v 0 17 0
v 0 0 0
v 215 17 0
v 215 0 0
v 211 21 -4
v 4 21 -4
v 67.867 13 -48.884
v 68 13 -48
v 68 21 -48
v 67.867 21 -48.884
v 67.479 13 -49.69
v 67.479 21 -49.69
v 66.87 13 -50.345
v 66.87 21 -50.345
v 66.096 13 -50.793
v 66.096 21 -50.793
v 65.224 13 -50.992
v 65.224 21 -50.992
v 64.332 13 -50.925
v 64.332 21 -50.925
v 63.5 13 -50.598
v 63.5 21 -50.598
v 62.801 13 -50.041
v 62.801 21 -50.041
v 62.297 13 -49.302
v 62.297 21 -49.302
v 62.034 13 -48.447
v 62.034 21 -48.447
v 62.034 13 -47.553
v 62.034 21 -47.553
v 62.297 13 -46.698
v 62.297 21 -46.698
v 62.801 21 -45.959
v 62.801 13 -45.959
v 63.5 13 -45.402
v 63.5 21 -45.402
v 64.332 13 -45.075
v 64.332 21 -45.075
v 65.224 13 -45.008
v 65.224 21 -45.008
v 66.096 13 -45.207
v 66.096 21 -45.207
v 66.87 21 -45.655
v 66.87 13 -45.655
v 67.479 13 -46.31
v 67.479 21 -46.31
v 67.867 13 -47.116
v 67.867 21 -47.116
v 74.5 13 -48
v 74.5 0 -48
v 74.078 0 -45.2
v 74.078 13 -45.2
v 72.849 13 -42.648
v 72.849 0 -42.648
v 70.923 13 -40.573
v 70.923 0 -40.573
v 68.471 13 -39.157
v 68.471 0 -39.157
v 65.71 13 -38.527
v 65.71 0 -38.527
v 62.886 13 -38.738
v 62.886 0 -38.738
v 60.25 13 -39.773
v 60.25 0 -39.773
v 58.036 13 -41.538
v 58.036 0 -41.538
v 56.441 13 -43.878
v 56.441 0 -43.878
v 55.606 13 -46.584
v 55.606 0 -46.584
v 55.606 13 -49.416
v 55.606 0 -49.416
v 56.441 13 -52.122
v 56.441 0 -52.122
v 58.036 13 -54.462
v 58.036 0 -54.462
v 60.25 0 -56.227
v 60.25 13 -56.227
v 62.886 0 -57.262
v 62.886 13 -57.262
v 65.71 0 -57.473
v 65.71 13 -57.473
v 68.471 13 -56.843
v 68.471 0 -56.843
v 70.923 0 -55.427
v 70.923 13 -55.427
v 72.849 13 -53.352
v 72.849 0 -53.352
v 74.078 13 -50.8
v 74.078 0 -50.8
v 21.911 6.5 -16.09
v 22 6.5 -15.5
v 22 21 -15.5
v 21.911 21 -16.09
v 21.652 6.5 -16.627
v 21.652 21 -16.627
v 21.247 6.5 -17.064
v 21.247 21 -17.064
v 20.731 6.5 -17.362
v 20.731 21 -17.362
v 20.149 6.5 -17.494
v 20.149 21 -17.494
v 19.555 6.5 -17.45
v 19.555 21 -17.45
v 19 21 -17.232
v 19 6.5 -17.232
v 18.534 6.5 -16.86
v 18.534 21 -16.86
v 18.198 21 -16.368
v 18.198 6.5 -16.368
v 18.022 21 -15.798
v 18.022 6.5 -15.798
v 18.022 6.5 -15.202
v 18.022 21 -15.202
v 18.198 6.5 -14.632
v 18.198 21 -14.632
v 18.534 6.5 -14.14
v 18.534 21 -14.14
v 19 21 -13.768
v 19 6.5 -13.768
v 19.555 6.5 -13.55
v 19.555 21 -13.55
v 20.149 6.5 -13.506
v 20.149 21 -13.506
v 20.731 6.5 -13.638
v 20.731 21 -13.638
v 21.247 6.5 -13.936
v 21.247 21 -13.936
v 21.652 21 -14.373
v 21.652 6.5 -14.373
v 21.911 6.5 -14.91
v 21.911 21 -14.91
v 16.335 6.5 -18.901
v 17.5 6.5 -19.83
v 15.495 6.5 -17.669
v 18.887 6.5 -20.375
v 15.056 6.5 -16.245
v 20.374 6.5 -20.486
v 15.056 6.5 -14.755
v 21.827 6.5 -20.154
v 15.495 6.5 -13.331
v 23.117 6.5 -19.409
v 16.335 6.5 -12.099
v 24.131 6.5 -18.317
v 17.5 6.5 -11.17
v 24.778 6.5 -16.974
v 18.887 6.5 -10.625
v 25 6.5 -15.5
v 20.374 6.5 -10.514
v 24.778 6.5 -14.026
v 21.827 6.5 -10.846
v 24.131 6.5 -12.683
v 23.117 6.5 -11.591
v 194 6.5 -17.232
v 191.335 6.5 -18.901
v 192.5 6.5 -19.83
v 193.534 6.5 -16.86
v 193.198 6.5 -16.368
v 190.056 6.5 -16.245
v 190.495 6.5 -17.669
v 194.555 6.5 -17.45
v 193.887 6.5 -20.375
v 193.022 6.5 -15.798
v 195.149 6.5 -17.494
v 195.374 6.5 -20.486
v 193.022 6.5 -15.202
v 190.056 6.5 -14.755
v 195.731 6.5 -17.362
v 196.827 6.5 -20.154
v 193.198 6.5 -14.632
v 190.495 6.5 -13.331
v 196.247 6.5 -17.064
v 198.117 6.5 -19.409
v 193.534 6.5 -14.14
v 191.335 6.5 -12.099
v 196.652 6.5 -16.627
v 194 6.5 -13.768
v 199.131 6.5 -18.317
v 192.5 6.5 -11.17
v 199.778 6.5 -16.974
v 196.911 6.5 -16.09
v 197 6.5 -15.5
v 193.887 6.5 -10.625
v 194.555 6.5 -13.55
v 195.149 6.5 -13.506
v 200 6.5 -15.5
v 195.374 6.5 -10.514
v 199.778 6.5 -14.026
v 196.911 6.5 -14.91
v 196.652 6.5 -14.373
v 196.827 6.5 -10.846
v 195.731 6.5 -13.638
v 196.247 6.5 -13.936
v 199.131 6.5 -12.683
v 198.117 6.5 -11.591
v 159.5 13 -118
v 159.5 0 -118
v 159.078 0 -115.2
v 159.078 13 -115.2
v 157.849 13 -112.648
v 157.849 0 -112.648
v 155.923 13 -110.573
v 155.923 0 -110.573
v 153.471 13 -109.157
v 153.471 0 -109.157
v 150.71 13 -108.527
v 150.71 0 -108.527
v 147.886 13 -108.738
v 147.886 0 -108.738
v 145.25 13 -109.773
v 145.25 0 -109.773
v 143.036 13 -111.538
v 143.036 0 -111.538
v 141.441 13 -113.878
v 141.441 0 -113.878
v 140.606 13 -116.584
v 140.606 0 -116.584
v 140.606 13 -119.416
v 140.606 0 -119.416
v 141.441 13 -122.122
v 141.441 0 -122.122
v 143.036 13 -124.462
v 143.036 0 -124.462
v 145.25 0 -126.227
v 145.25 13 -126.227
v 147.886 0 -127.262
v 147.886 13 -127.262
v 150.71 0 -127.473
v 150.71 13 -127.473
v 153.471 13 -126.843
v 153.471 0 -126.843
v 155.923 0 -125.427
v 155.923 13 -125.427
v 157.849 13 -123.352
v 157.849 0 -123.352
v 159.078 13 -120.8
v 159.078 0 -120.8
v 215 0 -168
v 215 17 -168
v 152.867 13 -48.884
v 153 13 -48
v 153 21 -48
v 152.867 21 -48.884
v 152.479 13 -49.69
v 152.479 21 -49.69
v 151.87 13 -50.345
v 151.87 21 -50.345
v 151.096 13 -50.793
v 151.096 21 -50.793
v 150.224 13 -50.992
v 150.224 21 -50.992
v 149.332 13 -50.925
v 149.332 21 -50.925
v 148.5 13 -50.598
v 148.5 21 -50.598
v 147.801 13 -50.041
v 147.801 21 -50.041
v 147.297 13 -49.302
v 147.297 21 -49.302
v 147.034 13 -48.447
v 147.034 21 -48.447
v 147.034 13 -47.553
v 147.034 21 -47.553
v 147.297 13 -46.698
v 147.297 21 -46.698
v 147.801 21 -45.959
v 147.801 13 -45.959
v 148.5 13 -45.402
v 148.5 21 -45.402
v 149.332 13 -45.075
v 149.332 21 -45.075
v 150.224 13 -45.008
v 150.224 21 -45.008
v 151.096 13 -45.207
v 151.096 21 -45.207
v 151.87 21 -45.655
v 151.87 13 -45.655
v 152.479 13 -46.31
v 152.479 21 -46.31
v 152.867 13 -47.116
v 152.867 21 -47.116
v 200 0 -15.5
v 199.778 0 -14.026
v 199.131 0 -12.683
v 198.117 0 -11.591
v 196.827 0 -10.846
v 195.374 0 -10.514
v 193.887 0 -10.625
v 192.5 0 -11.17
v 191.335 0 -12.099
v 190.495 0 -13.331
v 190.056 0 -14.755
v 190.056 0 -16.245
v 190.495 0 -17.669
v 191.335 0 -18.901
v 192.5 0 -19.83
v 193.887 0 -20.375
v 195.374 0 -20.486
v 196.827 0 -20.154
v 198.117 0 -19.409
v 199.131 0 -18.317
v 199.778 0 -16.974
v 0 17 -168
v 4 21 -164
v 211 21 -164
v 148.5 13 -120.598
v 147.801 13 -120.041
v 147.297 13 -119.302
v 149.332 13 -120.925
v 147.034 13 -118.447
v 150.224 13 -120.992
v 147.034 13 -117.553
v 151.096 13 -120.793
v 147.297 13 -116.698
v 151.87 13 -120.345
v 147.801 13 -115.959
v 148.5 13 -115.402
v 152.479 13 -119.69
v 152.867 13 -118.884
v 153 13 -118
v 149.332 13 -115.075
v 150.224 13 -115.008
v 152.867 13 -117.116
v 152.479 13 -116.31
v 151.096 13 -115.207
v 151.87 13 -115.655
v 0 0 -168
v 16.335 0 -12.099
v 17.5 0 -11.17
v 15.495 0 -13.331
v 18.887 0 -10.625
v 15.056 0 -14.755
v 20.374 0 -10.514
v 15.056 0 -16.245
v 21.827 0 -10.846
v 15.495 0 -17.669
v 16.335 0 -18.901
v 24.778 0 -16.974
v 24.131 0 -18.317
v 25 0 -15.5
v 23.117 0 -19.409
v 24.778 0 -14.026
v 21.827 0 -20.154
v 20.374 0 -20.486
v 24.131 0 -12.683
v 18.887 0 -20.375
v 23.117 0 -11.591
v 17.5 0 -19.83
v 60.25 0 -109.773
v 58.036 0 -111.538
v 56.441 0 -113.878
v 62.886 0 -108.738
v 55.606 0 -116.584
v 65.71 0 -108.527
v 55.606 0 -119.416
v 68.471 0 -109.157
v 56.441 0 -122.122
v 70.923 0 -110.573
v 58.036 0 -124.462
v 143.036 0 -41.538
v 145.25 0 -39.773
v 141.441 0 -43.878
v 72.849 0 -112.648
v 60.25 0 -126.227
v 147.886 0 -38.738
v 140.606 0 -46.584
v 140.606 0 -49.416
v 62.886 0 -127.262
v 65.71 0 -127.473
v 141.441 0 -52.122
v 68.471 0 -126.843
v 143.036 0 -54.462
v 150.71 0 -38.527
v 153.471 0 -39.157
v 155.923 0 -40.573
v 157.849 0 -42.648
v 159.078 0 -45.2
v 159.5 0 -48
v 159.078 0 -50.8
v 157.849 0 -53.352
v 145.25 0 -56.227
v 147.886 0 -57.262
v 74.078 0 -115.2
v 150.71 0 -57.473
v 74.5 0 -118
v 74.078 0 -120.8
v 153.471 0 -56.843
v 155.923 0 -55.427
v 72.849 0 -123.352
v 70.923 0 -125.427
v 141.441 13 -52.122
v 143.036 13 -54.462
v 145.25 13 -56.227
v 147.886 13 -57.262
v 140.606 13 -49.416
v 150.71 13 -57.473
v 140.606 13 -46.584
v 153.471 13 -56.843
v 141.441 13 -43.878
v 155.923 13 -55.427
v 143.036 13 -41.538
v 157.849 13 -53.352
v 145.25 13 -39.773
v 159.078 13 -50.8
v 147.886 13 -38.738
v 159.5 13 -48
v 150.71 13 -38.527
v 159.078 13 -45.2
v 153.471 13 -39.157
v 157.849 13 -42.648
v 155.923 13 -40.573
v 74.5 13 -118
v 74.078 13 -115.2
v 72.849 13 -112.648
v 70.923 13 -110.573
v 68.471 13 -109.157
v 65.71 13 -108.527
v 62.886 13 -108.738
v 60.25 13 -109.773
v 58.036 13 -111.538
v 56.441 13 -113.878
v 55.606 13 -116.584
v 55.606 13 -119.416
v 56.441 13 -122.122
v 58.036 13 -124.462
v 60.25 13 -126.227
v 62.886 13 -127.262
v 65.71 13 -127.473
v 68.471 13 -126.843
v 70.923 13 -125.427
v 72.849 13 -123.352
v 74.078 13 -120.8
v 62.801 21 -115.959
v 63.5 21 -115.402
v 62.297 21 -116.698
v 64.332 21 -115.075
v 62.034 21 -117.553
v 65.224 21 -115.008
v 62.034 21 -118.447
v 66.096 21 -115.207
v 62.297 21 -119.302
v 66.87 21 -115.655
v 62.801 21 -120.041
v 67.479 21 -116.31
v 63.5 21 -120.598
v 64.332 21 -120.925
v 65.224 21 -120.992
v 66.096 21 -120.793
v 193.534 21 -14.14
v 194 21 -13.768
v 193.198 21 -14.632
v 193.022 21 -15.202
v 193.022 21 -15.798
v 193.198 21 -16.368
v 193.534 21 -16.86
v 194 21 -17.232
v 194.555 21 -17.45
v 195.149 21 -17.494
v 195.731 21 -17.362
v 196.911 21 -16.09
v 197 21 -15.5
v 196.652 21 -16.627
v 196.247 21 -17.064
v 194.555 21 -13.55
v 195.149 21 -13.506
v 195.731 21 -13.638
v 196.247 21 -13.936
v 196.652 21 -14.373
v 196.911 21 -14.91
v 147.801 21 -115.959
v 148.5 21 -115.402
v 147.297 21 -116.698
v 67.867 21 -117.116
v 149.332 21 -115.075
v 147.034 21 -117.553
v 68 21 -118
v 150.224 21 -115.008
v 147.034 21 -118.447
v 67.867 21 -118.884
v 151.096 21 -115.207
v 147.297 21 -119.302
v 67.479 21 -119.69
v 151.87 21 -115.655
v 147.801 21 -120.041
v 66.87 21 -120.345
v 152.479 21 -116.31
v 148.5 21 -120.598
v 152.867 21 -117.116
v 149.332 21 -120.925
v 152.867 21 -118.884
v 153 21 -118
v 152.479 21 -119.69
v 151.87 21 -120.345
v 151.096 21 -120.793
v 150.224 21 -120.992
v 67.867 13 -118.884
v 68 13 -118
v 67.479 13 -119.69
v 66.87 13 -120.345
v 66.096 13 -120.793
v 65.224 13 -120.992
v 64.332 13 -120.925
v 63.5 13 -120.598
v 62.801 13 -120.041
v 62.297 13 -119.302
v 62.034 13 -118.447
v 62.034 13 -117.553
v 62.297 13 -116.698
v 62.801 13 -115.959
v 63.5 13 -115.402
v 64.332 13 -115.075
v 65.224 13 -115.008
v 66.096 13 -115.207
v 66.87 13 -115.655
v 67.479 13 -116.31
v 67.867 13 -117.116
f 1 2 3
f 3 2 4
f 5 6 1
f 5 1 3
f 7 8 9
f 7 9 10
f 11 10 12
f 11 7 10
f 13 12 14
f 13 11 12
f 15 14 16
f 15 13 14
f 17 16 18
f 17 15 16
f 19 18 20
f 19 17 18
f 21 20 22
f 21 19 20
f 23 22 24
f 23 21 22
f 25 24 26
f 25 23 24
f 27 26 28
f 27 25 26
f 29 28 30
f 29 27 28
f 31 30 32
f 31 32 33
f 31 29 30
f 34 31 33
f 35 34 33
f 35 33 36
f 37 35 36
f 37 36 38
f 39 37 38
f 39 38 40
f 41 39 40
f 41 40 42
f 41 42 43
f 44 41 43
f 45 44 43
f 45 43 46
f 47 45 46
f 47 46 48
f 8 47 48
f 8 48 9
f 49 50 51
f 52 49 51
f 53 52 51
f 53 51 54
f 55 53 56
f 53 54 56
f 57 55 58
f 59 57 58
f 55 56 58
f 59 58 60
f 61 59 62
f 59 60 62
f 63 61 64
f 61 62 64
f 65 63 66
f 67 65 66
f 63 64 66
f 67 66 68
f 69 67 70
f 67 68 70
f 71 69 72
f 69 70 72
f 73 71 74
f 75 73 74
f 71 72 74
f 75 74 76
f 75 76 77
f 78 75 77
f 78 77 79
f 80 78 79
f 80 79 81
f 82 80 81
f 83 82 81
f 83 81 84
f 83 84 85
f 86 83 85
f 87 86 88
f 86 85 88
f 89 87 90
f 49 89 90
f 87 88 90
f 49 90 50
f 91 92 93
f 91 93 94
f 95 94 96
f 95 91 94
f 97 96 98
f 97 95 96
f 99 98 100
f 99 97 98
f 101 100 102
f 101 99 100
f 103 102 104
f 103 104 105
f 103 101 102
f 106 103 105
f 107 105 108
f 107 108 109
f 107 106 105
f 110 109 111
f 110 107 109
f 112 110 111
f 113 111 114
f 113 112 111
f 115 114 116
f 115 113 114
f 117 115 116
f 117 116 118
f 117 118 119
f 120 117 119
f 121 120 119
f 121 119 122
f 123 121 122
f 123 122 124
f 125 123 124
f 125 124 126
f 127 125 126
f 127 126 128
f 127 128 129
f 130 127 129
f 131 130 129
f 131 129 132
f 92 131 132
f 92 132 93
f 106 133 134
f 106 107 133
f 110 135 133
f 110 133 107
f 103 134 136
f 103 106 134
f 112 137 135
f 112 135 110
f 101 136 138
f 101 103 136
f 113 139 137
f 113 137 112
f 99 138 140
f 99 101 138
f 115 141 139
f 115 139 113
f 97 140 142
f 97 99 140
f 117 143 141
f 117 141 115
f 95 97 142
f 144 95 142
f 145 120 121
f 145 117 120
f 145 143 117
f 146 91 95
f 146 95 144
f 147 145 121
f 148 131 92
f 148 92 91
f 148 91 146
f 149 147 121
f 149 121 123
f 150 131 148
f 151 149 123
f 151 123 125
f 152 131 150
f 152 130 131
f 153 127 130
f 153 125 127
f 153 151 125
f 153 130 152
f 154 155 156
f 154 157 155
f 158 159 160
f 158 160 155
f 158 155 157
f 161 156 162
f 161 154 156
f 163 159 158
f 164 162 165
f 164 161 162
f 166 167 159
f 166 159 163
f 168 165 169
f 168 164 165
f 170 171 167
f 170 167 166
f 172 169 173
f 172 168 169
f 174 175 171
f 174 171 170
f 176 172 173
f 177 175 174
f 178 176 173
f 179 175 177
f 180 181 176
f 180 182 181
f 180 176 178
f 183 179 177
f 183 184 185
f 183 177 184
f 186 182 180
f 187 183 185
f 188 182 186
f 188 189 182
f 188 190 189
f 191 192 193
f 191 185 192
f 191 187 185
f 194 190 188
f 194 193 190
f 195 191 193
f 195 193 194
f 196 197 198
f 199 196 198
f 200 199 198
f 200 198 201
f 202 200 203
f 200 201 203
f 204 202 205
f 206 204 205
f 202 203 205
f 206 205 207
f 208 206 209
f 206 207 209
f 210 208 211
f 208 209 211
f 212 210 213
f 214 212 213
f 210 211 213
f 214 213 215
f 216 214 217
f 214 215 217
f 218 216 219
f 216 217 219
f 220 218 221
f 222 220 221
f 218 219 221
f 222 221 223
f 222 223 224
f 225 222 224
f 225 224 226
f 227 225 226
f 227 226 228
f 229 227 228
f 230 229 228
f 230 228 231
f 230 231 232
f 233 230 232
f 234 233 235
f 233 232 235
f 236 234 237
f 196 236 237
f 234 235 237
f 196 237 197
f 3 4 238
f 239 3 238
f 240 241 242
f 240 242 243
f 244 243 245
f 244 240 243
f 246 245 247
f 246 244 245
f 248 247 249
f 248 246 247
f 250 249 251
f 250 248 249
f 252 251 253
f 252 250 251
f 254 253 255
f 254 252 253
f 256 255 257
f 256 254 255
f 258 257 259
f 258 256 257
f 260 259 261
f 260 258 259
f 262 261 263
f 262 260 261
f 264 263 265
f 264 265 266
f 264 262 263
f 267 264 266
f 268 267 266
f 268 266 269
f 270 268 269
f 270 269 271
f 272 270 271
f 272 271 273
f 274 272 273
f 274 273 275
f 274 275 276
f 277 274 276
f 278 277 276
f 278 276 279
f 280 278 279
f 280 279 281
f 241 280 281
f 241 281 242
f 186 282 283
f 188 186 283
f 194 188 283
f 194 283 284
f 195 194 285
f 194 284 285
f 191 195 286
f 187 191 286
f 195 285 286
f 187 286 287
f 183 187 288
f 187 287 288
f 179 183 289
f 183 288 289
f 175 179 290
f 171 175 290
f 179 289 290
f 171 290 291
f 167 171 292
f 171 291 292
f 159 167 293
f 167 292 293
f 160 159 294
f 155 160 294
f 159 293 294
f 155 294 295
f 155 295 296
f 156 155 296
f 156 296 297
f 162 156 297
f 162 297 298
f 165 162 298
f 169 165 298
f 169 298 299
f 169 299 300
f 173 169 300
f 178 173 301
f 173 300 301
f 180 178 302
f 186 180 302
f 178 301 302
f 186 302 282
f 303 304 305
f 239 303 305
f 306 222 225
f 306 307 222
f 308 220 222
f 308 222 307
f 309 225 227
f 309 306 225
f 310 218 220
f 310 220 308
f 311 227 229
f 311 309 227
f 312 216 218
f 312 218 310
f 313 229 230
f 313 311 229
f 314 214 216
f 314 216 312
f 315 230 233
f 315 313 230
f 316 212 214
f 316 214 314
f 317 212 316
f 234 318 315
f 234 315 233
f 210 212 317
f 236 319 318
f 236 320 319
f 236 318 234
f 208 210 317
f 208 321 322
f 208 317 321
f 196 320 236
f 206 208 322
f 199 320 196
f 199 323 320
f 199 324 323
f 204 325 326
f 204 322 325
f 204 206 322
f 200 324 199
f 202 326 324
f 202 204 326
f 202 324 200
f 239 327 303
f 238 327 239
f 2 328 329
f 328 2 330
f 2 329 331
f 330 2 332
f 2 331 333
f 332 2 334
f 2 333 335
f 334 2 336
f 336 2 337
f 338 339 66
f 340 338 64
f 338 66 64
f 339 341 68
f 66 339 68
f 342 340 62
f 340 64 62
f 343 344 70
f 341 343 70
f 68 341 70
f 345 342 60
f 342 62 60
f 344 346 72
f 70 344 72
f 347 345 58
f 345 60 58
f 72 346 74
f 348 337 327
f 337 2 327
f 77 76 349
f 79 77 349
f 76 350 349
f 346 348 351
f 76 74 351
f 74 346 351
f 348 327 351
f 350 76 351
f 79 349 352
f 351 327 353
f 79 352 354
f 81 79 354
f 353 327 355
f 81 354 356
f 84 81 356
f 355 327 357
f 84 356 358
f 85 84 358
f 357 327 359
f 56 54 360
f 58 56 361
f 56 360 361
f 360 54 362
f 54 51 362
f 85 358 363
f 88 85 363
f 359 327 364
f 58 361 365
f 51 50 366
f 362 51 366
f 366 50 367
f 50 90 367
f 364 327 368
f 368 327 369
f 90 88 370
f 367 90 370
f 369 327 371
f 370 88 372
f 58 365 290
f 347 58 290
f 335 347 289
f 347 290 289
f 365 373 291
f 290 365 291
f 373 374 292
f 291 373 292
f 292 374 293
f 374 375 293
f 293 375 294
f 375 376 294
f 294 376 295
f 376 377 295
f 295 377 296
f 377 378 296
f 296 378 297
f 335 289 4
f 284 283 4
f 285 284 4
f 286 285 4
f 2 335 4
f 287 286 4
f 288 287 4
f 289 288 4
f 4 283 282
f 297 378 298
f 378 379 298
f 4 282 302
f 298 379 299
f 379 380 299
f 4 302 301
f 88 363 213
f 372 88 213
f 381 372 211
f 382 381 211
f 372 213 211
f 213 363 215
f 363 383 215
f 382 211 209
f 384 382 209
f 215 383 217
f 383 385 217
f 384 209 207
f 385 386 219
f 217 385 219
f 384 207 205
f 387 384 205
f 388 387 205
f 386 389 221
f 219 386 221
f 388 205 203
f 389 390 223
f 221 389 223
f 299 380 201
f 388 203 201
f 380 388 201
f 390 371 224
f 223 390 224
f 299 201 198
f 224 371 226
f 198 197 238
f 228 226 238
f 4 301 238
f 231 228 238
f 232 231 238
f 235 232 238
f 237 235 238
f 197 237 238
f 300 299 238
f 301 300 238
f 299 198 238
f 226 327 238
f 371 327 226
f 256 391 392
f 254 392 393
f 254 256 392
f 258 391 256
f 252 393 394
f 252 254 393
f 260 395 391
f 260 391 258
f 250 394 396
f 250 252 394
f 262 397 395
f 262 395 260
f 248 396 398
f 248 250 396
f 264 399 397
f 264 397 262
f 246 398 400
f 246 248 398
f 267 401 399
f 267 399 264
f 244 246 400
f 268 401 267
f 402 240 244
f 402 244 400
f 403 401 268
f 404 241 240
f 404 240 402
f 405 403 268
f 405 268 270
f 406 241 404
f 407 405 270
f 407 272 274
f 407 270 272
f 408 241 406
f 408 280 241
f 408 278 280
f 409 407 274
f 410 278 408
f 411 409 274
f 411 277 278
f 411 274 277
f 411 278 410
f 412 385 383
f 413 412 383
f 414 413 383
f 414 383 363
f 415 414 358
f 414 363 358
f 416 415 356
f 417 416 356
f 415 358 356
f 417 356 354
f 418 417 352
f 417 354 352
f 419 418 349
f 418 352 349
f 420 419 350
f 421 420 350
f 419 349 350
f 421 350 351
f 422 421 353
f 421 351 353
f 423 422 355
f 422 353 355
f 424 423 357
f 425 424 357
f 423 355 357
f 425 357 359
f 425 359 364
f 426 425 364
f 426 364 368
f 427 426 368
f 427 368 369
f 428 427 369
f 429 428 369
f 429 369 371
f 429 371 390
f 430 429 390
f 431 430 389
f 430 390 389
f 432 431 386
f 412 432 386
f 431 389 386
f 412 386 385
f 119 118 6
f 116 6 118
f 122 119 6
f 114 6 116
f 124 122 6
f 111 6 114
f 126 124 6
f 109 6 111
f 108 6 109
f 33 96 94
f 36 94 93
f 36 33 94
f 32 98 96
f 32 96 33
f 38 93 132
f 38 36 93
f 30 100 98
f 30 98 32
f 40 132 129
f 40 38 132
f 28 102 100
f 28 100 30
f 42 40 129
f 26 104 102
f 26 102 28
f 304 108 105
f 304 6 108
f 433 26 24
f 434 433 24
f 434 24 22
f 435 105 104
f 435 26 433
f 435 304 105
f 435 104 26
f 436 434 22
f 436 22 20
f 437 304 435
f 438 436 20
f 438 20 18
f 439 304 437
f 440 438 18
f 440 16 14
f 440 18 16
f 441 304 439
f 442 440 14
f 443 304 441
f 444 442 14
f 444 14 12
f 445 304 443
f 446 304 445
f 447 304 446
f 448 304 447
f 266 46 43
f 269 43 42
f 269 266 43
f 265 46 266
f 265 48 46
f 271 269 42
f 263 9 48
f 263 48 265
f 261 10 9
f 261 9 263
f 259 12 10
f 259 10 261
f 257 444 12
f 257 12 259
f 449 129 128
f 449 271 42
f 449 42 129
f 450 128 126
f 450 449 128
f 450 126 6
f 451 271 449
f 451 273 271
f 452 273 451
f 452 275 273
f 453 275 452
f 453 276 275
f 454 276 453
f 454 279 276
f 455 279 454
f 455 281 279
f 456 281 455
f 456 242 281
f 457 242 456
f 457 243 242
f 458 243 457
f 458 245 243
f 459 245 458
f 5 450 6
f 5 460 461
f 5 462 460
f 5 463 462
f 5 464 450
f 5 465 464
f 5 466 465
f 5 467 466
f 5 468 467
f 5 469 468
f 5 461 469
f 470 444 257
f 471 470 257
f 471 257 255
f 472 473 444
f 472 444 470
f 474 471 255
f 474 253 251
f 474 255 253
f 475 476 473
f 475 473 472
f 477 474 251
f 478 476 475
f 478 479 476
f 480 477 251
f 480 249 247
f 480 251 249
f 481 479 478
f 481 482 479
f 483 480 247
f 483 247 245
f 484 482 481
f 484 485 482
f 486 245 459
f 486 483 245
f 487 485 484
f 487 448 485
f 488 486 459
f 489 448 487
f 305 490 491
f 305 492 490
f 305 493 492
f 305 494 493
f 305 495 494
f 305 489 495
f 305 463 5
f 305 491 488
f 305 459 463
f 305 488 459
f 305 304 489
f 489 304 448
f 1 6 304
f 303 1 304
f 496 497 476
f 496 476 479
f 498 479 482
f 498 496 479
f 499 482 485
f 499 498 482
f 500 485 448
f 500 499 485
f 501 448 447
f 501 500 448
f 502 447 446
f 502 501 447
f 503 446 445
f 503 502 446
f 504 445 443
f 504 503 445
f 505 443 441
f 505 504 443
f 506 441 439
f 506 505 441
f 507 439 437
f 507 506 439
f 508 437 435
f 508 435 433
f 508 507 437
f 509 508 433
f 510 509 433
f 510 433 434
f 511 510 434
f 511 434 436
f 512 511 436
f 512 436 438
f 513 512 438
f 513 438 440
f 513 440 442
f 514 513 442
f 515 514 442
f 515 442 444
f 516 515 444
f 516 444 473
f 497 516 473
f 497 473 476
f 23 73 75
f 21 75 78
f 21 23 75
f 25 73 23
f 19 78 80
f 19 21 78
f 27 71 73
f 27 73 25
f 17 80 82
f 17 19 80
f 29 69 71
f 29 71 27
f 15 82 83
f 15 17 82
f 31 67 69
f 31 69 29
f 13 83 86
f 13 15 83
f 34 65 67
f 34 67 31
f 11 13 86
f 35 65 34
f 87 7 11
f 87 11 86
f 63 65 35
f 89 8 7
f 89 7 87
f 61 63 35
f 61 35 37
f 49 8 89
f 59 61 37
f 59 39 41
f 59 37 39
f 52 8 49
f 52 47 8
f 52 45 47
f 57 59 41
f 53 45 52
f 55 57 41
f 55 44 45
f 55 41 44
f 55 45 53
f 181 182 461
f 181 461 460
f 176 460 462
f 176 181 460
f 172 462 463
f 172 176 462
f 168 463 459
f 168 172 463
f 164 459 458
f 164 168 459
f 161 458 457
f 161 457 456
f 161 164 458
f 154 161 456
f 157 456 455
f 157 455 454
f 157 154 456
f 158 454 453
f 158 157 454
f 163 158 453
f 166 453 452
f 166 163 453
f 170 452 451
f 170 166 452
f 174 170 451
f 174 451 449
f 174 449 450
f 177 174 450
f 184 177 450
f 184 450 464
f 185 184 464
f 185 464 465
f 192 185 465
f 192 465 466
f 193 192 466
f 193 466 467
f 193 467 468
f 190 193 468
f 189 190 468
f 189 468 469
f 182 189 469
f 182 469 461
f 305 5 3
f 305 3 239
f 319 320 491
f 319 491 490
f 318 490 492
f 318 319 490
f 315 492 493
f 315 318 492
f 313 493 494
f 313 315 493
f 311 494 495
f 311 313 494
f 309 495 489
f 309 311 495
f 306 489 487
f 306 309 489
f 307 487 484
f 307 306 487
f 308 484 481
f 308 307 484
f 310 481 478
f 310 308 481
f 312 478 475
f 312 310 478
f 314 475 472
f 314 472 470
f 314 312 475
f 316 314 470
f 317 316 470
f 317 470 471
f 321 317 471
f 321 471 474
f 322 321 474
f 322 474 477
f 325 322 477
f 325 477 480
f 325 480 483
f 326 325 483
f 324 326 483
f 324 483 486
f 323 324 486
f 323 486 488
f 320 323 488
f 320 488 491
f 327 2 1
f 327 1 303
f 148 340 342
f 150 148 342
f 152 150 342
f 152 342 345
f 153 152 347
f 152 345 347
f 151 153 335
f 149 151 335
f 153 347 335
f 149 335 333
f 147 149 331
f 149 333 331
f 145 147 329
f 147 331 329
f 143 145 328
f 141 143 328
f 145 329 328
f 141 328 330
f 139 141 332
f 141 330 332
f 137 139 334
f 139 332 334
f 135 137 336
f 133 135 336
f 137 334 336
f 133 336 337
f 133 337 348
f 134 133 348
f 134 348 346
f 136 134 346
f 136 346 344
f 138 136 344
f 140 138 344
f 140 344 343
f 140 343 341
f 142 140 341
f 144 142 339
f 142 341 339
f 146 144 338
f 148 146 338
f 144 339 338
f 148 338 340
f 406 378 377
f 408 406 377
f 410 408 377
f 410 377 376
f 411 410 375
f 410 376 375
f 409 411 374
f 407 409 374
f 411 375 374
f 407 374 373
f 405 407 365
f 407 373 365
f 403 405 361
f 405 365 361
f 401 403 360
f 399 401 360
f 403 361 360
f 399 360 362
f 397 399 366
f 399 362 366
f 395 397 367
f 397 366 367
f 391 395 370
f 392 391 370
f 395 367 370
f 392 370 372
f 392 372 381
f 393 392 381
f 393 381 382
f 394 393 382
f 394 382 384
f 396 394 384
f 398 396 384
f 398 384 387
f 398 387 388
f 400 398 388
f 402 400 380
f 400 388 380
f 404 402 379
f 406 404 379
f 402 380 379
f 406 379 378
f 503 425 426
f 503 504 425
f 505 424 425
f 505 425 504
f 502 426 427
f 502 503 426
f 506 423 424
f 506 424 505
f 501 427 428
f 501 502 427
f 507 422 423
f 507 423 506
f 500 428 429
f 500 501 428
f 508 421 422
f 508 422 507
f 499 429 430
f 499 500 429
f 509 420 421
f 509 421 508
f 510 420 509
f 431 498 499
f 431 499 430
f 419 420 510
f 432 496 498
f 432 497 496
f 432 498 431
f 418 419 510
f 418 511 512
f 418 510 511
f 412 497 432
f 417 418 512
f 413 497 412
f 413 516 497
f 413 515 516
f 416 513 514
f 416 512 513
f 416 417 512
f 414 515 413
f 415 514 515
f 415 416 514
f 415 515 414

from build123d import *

# Parameters (mm, degrees)
SKETCH1_W           = 215
SKETCH1_H           = 168
SKETCH1_R           = 3
SKETCH1_R_2         = 2
BOSS_EXTRUDE1_DEPTH = 21
CHAMFER1_SIZE       = 4
SKETCH2_R           = 9.5
CUT_EXTRUDE1_DEPTH  = 13
SKETCH4_R           = 5
CUT_EXTRUDE2_DEPTH  = 6.5


with BuildPart() as part:
    # Sketch1 → Boss-Extrude1 (new body)
    with BuildSketch(Plane(origin=(0, 0, 0), x_dir=(1, 0, 0), z_dir=(0, 1, 0))):
        with Locations((107.5, 84)):
            Rectangle(SKETCH1_W, SKETCH1_H)
        with Locations((150, 118)):
            Circle(SKETCH1_R, mode=Mode.SUBTRACT)
        with Locations((65, 118)):
            Circle(SKETCH1_R, mode=Mode.SUBTRACT)
        with Locations((65, 48)):
            Circle(SKETCH1_R, mode=Mode.SUBTRACT)
        with Locations((150, 48)):
            Circle(SKETCH1_R, mode=Mode.SUBTRACT)
        with Locations((20, 15.5)):
            Circle(SKETCH1_R_2, mode=Mode.SUBTRACT)
        with Locations((195, 15.5)):
            Circle(SKETCH1_R_2, mode=Mode.SUBTRACT)
    extrude(amount=BOSS_EXTRUDE1_DEPTH)

    # Chamfer1
    chamfer1_edges = [part.edges().sort_by_distance(p)[0] for p in [
        (215, 21, -84),
        (107.5, 21, -168),
        (0, 21, -84),
        (107.5, 21, 0),
    ]]
    chamfer(chamfer1_edges, length=CHAMFER1_SIZE)

    # Sketch2 → Cut-Extrude1 (cut)
    with BuildSketch(Plane.XZ):
        with Locations((65, -48)):
            Circle(SKETCH2_R)
        with Locations((150, -48)):
            Circle(SKETCH2_R)
        with Locations((65, -118)):
            Circle(SKETCH2_R)
        with Locations((150, -118)):
            Circle(SKETCH2_R)
    extrude(amount=-CUT_EXTRUDE1_DEPTH, mode=Mode.SUBTRACT)

    # Sketch4 → Cut-Extrude2 (cut)
    with BuildSketch(Plane.XZ):
        with Locations((20, -15.5)):
            Circle(SKETCH4_R)
        with Locations((195, -15.5)):
            Circle(SKETCH4_R)
    extrude(amount=-CUT_EXTRUDE2_DEPTH, mode=Mode.SUBTRACT)


solid = part.part
